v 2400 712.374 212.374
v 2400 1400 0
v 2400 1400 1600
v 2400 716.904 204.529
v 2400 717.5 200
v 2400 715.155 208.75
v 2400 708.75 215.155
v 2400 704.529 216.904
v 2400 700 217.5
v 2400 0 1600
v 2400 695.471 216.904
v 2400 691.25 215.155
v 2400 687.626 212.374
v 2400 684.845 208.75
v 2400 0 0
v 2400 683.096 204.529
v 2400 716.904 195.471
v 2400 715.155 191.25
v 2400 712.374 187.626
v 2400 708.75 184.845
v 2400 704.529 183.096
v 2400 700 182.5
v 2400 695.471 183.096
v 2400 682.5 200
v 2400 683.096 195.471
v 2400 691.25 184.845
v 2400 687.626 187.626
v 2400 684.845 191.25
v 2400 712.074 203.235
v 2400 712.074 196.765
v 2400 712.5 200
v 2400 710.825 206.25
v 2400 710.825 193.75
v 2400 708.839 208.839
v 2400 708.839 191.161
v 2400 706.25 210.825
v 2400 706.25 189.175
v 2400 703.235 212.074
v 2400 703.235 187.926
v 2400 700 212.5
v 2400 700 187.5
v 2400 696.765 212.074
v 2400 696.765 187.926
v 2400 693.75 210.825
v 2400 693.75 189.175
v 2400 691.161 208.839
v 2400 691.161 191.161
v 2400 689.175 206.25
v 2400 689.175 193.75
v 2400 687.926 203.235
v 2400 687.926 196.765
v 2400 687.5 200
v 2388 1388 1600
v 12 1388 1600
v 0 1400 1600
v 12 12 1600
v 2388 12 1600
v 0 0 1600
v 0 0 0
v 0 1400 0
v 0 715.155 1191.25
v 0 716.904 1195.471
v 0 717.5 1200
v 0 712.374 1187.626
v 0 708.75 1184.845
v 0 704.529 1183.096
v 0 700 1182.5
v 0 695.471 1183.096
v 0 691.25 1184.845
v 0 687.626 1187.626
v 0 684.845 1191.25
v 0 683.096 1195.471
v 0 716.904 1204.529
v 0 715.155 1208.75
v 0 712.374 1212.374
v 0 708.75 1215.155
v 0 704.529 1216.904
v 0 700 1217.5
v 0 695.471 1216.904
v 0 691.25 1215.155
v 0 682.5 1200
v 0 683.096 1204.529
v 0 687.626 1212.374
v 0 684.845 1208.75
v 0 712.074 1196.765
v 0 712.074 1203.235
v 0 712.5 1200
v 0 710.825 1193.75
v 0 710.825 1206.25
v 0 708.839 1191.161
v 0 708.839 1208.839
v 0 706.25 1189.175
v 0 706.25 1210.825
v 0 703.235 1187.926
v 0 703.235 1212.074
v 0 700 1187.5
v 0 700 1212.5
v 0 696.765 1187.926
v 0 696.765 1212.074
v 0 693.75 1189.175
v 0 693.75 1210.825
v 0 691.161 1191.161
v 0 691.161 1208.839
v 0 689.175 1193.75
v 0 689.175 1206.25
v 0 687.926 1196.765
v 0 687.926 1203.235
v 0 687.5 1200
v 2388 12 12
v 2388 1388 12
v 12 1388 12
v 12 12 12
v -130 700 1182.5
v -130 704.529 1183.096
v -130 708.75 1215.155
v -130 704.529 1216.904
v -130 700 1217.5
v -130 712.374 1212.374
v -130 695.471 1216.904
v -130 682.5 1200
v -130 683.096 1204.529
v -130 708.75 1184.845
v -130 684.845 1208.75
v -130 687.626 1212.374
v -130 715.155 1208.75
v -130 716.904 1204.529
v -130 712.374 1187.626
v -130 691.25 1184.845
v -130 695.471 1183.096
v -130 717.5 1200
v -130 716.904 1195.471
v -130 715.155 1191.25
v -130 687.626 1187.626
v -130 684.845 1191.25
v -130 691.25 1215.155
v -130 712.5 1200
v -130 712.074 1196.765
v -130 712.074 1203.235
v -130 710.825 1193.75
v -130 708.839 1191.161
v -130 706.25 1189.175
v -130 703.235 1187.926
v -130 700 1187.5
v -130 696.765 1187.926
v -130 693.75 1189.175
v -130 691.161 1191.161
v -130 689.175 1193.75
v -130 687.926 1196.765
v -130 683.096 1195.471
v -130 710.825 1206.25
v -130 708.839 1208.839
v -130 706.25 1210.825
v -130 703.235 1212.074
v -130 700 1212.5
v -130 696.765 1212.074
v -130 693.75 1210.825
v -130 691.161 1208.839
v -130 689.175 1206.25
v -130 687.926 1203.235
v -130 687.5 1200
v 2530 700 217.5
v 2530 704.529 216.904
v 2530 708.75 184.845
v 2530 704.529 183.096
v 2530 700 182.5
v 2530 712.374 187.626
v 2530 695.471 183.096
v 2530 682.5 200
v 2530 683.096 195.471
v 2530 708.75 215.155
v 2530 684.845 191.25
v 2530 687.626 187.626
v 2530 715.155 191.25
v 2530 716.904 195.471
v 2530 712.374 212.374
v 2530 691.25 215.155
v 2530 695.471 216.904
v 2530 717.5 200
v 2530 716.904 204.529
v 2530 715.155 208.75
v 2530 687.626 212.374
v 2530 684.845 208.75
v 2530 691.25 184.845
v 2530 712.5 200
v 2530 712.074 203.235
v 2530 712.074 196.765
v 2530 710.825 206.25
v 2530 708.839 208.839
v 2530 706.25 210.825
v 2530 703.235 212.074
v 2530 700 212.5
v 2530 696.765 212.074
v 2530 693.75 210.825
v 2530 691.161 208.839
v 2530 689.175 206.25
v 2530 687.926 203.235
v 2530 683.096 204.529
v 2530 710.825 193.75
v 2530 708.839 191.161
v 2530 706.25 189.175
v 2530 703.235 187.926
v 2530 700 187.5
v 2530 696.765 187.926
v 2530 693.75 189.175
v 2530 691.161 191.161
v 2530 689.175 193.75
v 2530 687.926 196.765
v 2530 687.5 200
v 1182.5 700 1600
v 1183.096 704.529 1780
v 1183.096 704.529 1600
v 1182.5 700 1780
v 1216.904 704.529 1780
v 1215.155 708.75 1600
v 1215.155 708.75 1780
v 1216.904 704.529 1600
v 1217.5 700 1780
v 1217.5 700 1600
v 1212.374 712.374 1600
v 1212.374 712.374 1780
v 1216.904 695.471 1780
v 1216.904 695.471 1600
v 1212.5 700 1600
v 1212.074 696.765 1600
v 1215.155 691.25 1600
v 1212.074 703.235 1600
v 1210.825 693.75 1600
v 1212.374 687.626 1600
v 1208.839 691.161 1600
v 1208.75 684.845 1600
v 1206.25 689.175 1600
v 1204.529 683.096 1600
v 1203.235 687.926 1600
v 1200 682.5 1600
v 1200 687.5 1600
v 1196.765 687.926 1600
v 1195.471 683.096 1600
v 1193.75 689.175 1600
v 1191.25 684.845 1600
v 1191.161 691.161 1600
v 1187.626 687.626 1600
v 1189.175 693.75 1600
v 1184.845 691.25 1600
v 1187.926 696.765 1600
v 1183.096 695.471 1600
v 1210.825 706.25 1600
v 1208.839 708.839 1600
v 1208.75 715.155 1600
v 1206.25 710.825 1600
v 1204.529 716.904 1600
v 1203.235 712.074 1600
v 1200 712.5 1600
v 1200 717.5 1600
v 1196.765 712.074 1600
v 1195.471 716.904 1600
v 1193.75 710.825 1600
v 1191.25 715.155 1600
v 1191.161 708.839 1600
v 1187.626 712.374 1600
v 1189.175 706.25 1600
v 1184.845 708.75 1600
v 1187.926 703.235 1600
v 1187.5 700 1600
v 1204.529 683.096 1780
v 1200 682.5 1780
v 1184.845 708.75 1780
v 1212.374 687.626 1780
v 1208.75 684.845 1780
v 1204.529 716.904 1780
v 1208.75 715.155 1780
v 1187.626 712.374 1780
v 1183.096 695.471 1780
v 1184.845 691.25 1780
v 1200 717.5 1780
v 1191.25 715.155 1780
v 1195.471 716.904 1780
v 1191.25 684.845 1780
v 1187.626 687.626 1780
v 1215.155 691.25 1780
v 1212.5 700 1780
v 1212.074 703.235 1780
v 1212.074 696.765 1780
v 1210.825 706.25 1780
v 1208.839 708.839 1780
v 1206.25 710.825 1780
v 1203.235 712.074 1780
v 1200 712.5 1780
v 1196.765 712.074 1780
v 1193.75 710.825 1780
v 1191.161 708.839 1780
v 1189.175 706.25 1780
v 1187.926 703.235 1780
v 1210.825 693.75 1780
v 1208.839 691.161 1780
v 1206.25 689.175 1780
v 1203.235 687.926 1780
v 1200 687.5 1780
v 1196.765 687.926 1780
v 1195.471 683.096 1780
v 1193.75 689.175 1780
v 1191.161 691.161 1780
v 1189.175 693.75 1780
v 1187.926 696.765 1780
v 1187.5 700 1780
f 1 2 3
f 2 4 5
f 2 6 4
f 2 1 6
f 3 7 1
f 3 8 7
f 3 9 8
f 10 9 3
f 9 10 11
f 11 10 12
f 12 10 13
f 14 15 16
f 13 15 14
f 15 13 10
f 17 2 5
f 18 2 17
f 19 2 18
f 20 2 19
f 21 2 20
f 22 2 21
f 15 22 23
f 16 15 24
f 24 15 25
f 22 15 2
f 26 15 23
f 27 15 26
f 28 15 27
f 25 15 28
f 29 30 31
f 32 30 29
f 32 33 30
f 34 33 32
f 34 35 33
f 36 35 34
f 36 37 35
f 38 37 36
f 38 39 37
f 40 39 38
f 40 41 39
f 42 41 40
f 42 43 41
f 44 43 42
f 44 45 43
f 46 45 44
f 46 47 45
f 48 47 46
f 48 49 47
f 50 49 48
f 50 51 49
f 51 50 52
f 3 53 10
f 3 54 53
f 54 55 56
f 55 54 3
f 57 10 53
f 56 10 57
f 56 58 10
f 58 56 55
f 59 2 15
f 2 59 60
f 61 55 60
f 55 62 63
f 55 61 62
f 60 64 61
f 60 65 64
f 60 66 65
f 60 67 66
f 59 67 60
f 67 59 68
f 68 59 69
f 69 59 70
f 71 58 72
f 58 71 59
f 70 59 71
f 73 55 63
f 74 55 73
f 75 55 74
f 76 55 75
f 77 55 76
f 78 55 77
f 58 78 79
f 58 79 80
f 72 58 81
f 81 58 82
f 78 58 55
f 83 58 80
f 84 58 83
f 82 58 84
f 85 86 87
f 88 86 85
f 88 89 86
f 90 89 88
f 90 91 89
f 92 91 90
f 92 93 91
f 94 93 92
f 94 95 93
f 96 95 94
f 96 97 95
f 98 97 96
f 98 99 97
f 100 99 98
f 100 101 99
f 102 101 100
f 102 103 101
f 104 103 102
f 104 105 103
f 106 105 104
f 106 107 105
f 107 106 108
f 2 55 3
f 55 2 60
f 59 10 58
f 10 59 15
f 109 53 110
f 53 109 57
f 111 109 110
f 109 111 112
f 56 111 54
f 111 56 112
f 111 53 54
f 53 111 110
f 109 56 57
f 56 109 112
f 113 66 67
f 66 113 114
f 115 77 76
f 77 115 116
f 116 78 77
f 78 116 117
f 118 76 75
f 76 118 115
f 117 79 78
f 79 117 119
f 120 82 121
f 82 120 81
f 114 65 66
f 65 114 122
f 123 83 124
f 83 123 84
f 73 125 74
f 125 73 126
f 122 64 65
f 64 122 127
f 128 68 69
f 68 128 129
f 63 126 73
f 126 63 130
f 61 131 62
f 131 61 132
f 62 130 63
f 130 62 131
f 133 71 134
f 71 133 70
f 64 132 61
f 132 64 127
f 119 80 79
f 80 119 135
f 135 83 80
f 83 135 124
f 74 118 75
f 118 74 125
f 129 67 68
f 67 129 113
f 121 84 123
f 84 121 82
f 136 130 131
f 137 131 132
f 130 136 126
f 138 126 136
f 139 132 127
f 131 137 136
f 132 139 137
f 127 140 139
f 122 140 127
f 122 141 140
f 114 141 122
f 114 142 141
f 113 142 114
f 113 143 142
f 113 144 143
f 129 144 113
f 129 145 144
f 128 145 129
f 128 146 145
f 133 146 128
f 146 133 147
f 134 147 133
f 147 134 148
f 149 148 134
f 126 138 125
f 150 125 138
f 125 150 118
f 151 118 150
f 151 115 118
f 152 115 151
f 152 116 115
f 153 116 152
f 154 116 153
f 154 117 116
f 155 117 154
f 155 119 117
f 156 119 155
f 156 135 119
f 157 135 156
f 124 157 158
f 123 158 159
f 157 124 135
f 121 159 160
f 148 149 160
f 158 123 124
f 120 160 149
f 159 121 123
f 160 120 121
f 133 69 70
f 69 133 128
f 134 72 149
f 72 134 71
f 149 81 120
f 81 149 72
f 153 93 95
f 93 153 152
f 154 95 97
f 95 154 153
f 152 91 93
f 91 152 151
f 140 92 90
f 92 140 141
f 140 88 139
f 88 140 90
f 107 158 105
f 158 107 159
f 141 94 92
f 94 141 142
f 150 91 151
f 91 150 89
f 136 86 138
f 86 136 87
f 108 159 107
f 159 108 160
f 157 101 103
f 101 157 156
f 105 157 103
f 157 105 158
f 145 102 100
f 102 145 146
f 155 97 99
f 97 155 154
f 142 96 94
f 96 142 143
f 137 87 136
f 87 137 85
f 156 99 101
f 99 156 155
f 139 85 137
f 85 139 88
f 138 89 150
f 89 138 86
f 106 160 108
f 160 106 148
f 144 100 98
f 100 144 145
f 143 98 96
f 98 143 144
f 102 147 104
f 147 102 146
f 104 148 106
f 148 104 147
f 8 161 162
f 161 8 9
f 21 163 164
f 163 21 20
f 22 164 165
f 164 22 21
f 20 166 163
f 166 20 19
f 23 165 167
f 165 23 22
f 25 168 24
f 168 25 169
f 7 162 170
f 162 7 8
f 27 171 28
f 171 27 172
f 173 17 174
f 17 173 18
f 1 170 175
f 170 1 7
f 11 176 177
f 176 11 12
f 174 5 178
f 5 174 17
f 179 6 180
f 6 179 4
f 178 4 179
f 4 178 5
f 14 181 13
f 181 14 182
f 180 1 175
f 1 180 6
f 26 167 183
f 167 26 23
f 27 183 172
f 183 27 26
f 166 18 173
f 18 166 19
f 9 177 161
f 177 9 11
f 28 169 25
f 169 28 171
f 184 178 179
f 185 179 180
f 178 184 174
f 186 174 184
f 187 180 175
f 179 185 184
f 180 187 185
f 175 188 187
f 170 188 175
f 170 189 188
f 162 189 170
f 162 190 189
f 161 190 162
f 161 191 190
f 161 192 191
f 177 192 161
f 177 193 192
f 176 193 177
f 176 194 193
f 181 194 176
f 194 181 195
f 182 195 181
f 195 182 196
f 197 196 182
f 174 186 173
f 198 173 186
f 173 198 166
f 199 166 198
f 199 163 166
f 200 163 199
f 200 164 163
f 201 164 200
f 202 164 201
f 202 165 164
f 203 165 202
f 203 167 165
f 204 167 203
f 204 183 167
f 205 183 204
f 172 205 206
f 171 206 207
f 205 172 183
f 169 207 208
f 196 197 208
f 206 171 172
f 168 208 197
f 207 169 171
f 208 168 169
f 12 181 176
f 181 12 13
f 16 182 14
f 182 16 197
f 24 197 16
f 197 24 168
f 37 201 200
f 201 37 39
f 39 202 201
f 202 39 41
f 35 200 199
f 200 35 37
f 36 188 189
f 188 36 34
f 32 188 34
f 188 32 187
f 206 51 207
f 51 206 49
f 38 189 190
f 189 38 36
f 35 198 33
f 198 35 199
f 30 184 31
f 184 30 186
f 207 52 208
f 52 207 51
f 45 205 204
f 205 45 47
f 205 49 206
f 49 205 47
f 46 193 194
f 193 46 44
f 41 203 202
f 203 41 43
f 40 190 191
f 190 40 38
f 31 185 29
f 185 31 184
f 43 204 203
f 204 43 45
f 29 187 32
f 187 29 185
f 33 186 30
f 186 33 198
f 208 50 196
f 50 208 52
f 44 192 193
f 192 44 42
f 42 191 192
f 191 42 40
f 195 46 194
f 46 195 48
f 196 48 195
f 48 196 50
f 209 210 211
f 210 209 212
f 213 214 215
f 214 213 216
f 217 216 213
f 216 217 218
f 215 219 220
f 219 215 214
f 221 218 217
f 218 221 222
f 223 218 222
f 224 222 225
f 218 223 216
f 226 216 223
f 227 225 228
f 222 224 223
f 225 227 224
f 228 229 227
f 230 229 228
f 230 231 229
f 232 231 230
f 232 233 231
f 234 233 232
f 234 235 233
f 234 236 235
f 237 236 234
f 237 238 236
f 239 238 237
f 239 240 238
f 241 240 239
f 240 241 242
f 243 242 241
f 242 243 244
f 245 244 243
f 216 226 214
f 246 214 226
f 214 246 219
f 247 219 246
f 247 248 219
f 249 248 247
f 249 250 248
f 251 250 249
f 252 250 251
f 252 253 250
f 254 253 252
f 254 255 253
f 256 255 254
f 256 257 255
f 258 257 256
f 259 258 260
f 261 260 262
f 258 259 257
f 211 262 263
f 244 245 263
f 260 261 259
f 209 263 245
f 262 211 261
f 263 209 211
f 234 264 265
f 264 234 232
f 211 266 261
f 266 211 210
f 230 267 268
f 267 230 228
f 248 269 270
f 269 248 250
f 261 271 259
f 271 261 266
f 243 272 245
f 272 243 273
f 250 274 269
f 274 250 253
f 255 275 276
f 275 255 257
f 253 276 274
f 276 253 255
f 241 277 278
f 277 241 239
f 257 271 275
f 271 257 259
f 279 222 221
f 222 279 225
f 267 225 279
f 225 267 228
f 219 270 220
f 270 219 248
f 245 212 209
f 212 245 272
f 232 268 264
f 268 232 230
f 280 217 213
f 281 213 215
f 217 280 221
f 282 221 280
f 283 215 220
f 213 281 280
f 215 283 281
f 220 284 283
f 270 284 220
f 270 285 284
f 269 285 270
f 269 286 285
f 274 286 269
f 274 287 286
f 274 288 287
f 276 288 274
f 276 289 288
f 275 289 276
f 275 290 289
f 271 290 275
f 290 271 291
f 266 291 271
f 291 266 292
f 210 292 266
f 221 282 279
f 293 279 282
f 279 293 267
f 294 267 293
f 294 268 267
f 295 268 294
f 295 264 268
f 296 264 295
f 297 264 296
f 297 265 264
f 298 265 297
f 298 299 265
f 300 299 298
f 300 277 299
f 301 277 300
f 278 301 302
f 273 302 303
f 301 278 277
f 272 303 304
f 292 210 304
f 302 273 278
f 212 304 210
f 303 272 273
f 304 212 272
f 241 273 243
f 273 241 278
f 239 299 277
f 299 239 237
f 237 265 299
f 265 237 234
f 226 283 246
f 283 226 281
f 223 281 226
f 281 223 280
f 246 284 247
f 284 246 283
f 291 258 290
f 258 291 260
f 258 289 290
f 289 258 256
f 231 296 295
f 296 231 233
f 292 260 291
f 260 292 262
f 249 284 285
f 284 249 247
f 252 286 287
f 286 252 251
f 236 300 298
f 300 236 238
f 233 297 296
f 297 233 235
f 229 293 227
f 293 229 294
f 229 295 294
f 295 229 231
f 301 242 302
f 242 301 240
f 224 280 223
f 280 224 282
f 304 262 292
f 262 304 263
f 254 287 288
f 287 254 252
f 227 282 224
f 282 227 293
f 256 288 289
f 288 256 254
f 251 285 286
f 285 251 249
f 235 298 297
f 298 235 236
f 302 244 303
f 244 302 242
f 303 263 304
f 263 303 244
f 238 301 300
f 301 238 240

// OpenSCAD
// file: ../params.scad
// Shared millimetre parameters. Keep in lockstep with freecad/params.py.
// Module scale: 150 kg/day wet train. Walls are CPVC sheet, not metal.

$fn = 36;

WALL        = 12;     // CPVC sheet thickness
FLOOR       = 16;     // floor plate (trough sits on this)

// LEACH CSTR 1 — inside liquor box
CSTR_L      = 2000;
CSTR_W      = 1200;
CSTR_H      = 1400;   // liquid + freeboard
FREEBOARD   = 200;

// CSTR 2 weir (same vessel, +X wall)
WEIR_W      = 450;
WEIR_CREST  = CSTR_H - FREEBOARD;   // from inner floor
WEIR_SLOT_H = 80;
WEIR_LIP    = 120;    // external spout projection

// CSTR 3 floor auger — injection-molded PVC / FG
AUGER_D     = 140;    // flight OD
AUGER_SHAFT = 40;
AUGER_PITCH = 110;
AUGER_TROUGH_W = 180;
AUGER_TROUGH_H = 110;
AUGER_OFFSET_Y = 280; // trough centreline from inner -Y wall
AUGER_INCLINE  = 28;  // deg, lifts out of liquor toward +X

// mixer / nozzles (lid)
MIXER_D     = 50;
GAS_D       = 80;     // acid-gas takeoff
DROP_X      = 80;     // inner-X of shred drop slot
DROP_L      = 400;
DROP_W      = 250;
DROP_COAM   = 80;     // raised coaming around the slot

// LEACHATE PUMP / coarse strainer — −X wall, opposite the weir
PUMP_D      = 80;     // DN80
PUMP_Z      = 450;    // centreline above inner floor (submerged)
PUMP_Y      = 900;    // centreline from inner −Y (away from auger)
STRAINER_L  = 180;
STRAINER_W  = 140;
STRAINER_H  = 160;

// mezzanine feed train
MEZZ_H      = 2200;   // platform top above tank outer floor
MEZZ_L      = 1600;   // platform length in −X
MEZZ_THK    = 12;
HOPPER_L    = 700;
HOPPER_W    = 600;
HOPPER_H    = 800;
SHRED_L     = 500;
SHRED_W     = 500;
SHRED_H     = 450;
CONV_W      = 240;
CONV_H      = 120;
CONV_PLATE  = 6;      // trough plate
CONV_FLANGE = 40;
CONV_SPRING_D = 50;
CONV_SPRING_H = 80;
CONV_BOLT   = 10;     // M10 clearance
CONV_LEN    = 1800;   // default standalone length; plant instance is computed
DUST_D      = 150;    // dust-hood outlet to DUST header
AUGER_LIFT_L = 700;

// dewater belts + split (Phase A 4–6)
FDEW_L      = 1800;
FDEW_W      = 450;
FDEW_H      = 80;
FDEW_RISE   = 120;    // solids end higher so liquor runs back to weir
SDEW_L      = 1400;
SDEW_W      = 220;
SDEW_H      = 80;
SPLIT_L     = 600;
SPLIT_W     = 500;
SPLIT_H     = 400;
STUB_L      = 400;
STUB_W      = 300;
STUB_H      = 250;

// EW funnel cell
EW_L        = 600;    // along aisle (overflow direction)
EW_W        = 420;    // anode-cathode depth
EW_H        = 650;    // rectangular body
EW_FUNNEL_H = 220;
EW_VALVE_D  = 50;
EW_VALVE_L  = 60;
EW_MEM_T    = 4;      // CEM
EW_SLOT     = 10;     // membrane cassette slot
EW_PITCH    = 750;    // aisle spacing, centre to centre
AISLE_X0    = 200;
AISLE_Y     = -(EW_W + 2*WALL) - 400;
AISLE_Z     = 400;
BUND_H      = 150;
BUND_PAD    = 250;
SUMP_L      = 400;
SUMP_W      = 400;
SUMP_H      = 300;
VDF_D       = 700;
VDF_L       = 900;
PAIL_W      = 180;
HDR_D       = 80;
HDR_Z       = 1400;
PYRO_D      = 320;
PYRO_L      = 2800;

// Campus envelopes — lockstep with freecad/params.py
FARM_X=12000; FARM_Y=8000; FARM_L=12000; FARM_W=8000; FARM_H=4500;
FAB_X=12000;  FAB_Y=-6000; FAB_L=8000;   FAB_W=6000;  FAB_H=4000;
HAB_X=-8000;  HAB_Y=8000;  HAB_L=8000;   HAB_W=6000;  HAB_H=3200;
CRYO_X=-6000; CRYO_Y=-4000; CRYO_L=4000; CRYO_W=3000; CRYO_H=3000;
MFG_X=2000;   MFG_Y=9000;  MFG_L=6000;   MFG_W=4000;  MFG_H=3500;

LIFE_Z_GREY=900; LIFE_Z_UPW=1100; LIFE_Z_ETCH=1300;
LIFE_Z_O2=2800; LIFE_Z_N2=3000; LIFE_Z_CO2=3200;
LIFE_D_GREY=50; LIFE_D_UPW=40; LIFE_D_ETCH=32;
LIFE_D_GAS=25; LIFE_D_CO2=40;
// main file
// ETCH RETURN — closed tank. E3 is local vent, not HDR_ACID_GAS.
include <../params.scad>;
$fn = 24;
L=2400; W=1400; H=1600; T=12;

module stub(d, l=130) {
    difference() {
        cylinder(h=l, d=d+10);
        translate([0,0,-1]) cylinder(h=l+2, d=d);
    }
}

module mfg_etch_return() {
    difference() {
        cube([L, W, H]);
        translate([T, T, T]) cube([L-2*T, W-2*T, H]);
    }
    translate([0, W/2, 1200]) rotate([0,-90,0]) stub(25); // E1
    translate([L, W/2, 200]) rotate([0,90,0]) stub(25);   // E2 REGEN LEACH
    translate([L/2, W/2, H]) stub(25, 180);               // E3 local
}

mfg_etch_return();
